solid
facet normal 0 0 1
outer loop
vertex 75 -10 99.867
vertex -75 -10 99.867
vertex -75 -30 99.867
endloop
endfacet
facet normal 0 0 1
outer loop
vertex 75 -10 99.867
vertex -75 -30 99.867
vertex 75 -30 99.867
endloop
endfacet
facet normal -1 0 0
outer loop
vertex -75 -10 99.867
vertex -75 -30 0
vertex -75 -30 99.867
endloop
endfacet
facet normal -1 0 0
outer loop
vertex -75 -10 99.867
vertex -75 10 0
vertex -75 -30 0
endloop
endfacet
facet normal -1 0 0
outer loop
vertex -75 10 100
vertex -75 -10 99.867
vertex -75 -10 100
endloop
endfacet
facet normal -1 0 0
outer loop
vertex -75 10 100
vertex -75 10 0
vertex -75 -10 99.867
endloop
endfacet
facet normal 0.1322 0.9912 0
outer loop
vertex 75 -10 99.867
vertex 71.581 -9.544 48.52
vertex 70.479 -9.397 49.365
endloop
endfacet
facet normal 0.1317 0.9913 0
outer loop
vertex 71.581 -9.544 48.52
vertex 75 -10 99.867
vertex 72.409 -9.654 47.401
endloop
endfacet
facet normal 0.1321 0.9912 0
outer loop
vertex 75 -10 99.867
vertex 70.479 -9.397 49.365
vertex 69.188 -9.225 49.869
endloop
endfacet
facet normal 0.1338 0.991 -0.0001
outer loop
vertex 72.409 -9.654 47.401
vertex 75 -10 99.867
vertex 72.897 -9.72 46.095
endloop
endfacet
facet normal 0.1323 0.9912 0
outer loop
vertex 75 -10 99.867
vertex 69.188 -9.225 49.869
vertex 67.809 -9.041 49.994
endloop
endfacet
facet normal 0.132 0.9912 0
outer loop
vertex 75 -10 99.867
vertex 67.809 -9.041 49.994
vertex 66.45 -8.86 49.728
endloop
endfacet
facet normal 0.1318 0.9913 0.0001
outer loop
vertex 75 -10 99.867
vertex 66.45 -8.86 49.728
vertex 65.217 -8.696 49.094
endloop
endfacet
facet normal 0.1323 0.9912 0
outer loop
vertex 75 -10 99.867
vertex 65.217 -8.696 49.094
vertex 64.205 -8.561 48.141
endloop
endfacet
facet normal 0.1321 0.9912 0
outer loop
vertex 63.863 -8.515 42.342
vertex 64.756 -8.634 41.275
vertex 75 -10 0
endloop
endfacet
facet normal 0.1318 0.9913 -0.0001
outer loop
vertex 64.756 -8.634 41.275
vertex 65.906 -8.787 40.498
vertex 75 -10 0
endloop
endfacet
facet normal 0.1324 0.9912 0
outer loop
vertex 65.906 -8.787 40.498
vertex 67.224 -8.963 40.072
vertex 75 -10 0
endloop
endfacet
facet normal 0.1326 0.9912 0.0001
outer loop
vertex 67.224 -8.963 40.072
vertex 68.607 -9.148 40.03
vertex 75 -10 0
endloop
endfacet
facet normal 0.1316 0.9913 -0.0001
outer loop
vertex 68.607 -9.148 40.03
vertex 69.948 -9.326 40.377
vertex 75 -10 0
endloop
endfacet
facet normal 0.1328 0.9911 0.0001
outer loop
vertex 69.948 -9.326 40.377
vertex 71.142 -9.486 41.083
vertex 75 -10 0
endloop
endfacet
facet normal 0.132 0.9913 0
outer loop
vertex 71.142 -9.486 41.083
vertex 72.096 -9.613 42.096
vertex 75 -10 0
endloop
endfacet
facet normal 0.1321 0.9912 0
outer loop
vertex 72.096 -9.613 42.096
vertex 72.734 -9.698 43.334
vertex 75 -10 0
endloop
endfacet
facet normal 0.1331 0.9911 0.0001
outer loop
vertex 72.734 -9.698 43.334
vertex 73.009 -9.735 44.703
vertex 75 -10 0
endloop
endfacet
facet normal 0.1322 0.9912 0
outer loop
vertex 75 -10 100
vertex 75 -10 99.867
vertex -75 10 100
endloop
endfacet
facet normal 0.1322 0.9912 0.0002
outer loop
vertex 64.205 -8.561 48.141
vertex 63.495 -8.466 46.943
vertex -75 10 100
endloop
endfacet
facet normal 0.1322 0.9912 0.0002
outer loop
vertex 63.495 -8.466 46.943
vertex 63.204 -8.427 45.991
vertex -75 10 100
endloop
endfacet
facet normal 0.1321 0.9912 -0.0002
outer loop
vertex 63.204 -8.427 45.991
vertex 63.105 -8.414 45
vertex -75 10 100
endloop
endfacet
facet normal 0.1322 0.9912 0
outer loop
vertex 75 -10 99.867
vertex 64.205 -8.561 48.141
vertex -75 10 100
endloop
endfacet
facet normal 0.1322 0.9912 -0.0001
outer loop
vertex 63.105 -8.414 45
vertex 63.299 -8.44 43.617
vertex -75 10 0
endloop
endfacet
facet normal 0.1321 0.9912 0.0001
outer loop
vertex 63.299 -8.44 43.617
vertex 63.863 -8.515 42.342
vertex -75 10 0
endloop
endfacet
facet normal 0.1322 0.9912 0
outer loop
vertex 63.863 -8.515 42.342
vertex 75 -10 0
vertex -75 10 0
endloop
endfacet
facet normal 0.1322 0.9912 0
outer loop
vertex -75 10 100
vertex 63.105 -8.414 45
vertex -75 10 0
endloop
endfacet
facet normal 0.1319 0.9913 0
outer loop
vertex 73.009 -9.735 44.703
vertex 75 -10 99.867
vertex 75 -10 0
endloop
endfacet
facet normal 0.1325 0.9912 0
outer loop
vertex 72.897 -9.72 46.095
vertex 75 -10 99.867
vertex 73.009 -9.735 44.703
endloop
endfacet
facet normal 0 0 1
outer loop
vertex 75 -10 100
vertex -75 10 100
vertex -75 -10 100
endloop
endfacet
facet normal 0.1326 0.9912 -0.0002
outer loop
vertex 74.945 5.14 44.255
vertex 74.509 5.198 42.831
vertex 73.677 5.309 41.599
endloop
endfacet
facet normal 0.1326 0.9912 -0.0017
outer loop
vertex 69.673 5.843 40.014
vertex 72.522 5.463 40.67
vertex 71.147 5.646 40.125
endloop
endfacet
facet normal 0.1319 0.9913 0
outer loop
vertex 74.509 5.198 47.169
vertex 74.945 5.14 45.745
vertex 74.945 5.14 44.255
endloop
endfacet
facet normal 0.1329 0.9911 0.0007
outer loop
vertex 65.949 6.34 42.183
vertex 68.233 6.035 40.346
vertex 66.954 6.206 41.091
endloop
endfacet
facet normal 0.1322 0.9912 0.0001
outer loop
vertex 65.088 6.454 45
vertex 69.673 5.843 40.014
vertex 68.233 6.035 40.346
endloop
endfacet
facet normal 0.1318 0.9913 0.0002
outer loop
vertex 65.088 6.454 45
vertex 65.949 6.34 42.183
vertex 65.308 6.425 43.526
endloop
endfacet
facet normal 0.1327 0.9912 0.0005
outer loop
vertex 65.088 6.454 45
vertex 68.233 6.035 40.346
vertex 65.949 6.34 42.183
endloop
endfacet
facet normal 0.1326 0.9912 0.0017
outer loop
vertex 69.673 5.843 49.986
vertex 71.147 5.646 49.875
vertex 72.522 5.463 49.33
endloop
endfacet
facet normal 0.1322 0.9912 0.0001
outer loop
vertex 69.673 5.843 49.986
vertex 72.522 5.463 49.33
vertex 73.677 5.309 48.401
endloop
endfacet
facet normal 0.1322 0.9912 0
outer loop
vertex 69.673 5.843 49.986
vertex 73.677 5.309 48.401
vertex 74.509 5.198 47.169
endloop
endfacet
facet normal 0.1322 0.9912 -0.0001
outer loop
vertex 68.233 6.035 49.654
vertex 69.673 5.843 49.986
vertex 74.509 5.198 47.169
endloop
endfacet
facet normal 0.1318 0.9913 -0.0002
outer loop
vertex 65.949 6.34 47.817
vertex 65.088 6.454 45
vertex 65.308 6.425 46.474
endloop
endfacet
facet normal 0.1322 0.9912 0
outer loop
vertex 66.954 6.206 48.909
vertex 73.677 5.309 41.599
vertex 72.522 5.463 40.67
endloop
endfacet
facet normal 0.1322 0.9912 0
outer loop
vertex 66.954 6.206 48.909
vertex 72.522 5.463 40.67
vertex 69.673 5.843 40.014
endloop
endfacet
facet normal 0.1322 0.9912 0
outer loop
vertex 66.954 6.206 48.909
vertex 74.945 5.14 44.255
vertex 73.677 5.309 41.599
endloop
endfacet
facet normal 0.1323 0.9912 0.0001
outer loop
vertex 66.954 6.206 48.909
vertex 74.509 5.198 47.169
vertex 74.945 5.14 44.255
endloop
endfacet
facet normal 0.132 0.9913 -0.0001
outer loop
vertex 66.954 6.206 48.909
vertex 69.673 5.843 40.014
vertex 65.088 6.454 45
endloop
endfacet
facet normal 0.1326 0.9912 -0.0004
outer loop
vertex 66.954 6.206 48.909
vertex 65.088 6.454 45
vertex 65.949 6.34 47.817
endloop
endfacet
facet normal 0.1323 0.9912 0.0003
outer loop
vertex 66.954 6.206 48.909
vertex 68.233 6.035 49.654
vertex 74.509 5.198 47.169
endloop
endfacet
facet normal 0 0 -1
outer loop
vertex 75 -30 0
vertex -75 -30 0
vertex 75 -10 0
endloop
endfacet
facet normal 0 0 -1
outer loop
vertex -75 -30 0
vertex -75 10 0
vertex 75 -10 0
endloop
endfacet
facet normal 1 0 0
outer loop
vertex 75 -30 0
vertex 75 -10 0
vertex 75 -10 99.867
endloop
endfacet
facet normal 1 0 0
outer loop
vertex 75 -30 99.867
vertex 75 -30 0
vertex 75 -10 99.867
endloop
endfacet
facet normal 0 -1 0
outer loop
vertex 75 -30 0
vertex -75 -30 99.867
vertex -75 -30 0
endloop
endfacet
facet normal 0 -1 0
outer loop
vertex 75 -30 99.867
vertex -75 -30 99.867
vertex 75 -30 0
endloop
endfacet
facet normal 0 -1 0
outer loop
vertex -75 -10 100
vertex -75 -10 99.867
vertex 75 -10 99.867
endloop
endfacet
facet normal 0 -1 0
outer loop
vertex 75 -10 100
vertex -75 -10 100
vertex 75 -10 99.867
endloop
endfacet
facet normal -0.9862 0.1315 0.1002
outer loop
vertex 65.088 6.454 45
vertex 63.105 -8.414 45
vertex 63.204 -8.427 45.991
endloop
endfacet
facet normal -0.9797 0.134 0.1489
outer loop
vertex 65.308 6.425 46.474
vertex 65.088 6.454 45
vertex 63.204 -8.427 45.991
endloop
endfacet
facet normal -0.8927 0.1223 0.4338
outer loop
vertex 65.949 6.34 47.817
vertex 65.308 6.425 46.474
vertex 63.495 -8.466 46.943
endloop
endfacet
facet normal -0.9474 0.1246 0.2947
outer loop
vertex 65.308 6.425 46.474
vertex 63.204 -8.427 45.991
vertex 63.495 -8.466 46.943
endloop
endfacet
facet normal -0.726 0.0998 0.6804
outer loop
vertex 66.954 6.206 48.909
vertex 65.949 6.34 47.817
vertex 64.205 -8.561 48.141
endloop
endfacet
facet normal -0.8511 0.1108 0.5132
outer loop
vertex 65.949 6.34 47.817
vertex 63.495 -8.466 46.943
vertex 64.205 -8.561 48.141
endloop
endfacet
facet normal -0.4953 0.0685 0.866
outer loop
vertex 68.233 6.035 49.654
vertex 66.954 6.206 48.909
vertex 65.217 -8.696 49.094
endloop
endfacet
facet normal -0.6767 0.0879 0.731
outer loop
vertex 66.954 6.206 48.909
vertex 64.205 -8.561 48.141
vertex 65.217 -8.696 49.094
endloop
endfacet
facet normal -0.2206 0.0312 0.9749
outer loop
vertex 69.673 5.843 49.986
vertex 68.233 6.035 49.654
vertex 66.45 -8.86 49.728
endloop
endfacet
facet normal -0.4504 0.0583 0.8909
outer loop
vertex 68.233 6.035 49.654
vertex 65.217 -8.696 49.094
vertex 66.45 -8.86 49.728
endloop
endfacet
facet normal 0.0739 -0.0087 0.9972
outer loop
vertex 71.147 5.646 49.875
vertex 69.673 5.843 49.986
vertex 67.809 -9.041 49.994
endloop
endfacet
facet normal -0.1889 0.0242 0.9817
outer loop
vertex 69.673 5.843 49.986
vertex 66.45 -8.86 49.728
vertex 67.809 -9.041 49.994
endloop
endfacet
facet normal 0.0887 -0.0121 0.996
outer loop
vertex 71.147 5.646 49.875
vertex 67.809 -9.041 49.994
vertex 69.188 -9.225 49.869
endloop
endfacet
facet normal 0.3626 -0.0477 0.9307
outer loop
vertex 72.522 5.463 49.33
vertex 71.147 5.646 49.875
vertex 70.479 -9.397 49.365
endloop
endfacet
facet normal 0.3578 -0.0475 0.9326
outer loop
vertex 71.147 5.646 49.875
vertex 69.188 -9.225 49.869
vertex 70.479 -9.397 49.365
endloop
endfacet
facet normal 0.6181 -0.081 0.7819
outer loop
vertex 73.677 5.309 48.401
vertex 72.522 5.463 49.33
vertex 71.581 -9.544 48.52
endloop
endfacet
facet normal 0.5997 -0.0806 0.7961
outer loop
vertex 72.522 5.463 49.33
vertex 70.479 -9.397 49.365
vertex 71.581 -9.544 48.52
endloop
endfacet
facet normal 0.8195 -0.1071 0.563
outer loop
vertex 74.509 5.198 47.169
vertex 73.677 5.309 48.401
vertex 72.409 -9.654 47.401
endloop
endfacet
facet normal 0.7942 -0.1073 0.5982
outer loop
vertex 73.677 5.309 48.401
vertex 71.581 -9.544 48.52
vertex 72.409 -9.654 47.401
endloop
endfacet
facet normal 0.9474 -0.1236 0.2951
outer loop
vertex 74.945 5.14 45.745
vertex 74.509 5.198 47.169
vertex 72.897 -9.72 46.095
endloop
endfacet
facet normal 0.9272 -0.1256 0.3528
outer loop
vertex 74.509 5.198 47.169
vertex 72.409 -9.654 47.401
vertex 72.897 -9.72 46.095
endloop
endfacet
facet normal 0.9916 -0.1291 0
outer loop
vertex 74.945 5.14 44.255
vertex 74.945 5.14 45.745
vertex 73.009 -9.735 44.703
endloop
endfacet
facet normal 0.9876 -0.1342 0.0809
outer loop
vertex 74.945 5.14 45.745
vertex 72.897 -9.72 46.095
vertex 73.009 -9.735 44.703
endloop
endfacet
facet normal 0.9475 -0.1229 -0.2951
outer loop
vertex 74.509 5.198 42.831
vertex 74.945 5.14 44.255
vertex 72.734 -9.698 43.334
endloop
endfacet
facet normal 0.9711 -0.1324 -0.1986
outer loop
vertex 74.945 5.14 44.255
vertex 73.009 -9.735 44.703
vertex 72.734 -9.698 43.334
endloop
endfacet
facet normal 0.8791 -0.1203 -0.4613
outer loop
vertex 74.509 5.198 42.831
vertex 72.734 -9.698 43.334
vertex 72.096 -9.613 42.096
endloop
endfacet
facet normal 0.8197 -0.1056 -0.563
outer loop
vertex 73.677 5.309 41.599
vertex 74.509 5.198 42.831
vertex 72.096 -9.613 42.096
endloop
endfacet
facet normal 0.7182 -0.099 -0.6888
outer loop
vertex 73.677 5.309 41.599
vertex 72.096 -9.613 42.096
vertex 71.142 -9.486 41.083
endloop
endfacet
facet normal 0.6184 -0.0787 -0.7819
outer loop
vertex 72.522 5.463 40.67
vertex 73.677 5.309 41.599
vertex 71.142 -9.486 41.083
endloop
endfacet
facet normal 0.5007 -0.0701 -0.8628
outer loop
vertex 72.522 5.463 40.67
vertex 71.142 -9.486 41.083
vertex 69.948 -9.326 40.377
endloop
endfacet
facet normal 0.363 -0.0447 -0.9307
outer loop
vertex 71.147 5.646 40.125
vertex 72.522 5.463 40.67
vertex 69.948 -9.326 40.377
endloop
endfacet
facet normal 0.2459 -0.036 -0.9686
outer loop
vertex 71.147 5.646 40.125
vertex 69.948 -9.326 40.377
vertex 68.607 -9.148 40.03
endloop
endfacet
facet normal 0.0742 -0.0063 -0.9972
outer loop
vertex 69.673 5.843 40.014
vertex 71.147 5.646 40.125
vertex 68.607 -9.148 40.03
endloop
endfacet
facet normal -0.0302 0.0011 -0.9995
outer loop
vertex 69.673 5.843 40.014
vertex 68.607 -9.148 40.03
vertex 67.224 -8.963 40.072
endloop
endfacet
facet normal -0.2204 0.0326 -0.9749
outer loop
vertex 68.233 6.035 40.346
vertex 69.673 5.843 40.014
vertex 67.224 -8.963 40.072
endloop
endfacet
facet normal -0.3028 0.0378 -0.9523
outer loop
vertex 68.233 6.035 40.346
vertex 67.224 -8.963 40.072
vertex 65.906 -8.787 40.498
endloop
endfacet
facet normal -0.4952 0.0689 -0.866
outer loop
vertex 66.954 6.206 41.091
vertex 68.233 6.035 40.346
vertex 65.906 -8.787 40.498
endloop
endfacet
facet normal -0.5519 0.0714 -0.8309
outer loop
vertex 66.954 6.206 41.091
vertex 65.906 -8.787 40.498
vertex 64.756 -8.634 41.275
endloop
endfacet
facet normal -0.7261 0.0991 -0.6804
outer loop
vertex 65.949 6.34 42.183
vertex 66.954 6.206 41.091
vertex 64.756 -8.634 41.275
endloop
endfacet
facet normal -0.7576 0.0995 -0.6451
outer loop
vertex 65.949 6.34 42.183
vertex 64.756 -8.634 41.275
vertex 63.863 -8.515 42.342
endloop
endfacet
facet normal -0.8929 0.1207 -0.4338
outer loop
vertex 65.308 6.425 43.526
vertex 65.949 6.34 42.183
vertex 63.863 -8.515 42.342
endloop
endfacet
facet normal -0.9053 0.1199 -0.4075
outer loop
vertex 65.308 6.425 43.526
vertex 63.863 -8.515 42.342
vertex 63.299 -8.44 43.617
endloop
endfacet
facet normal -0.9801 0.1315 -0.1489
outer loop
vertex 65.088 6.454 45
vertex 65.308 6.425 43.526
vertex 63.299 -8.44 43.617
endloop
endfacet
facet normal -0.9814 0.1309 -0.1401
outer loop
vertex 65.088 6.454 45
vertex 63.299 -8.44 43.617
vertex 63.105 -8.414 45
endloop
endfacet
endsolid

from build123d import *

# Parameters (mm, degrees)
F1_DEPTH = 100
F2_W     = 150
F2_H     = 99.866986
F3_DEPTH = 20
F4_R     = 5
F5_DEPTH = 15


with BuildPart() as f1:
    # F0 (on Top) → F1 (new body)
    with BuildSketch(Plane.XY):
        Polygon((-75, -10), (75, -10), (-75, 10), align=None)
    extrude(amount=F1_DEPTH)

    # F2 (on face) → F3 (join)
    with BuildSketch(Plane.XZ.offset(10)):
        with Locations((0, 49.933493)):
            Rectangle(F2_W, F2_H)
    extrude(amount=F3_DEPTH)

    # F4 (on face) → F5 (join)
    with BuildSketch(Plane(origin=(0, 0, 0), x_dir=(-0.991228, 0.132164, 0), z_dir=(0.132164, 0.991228, 0))):
        with Locations((-68.66373, 45)):
            Circle(F4_R)
    extrude(amount=F5_DEPTH)


solid = f1.part
